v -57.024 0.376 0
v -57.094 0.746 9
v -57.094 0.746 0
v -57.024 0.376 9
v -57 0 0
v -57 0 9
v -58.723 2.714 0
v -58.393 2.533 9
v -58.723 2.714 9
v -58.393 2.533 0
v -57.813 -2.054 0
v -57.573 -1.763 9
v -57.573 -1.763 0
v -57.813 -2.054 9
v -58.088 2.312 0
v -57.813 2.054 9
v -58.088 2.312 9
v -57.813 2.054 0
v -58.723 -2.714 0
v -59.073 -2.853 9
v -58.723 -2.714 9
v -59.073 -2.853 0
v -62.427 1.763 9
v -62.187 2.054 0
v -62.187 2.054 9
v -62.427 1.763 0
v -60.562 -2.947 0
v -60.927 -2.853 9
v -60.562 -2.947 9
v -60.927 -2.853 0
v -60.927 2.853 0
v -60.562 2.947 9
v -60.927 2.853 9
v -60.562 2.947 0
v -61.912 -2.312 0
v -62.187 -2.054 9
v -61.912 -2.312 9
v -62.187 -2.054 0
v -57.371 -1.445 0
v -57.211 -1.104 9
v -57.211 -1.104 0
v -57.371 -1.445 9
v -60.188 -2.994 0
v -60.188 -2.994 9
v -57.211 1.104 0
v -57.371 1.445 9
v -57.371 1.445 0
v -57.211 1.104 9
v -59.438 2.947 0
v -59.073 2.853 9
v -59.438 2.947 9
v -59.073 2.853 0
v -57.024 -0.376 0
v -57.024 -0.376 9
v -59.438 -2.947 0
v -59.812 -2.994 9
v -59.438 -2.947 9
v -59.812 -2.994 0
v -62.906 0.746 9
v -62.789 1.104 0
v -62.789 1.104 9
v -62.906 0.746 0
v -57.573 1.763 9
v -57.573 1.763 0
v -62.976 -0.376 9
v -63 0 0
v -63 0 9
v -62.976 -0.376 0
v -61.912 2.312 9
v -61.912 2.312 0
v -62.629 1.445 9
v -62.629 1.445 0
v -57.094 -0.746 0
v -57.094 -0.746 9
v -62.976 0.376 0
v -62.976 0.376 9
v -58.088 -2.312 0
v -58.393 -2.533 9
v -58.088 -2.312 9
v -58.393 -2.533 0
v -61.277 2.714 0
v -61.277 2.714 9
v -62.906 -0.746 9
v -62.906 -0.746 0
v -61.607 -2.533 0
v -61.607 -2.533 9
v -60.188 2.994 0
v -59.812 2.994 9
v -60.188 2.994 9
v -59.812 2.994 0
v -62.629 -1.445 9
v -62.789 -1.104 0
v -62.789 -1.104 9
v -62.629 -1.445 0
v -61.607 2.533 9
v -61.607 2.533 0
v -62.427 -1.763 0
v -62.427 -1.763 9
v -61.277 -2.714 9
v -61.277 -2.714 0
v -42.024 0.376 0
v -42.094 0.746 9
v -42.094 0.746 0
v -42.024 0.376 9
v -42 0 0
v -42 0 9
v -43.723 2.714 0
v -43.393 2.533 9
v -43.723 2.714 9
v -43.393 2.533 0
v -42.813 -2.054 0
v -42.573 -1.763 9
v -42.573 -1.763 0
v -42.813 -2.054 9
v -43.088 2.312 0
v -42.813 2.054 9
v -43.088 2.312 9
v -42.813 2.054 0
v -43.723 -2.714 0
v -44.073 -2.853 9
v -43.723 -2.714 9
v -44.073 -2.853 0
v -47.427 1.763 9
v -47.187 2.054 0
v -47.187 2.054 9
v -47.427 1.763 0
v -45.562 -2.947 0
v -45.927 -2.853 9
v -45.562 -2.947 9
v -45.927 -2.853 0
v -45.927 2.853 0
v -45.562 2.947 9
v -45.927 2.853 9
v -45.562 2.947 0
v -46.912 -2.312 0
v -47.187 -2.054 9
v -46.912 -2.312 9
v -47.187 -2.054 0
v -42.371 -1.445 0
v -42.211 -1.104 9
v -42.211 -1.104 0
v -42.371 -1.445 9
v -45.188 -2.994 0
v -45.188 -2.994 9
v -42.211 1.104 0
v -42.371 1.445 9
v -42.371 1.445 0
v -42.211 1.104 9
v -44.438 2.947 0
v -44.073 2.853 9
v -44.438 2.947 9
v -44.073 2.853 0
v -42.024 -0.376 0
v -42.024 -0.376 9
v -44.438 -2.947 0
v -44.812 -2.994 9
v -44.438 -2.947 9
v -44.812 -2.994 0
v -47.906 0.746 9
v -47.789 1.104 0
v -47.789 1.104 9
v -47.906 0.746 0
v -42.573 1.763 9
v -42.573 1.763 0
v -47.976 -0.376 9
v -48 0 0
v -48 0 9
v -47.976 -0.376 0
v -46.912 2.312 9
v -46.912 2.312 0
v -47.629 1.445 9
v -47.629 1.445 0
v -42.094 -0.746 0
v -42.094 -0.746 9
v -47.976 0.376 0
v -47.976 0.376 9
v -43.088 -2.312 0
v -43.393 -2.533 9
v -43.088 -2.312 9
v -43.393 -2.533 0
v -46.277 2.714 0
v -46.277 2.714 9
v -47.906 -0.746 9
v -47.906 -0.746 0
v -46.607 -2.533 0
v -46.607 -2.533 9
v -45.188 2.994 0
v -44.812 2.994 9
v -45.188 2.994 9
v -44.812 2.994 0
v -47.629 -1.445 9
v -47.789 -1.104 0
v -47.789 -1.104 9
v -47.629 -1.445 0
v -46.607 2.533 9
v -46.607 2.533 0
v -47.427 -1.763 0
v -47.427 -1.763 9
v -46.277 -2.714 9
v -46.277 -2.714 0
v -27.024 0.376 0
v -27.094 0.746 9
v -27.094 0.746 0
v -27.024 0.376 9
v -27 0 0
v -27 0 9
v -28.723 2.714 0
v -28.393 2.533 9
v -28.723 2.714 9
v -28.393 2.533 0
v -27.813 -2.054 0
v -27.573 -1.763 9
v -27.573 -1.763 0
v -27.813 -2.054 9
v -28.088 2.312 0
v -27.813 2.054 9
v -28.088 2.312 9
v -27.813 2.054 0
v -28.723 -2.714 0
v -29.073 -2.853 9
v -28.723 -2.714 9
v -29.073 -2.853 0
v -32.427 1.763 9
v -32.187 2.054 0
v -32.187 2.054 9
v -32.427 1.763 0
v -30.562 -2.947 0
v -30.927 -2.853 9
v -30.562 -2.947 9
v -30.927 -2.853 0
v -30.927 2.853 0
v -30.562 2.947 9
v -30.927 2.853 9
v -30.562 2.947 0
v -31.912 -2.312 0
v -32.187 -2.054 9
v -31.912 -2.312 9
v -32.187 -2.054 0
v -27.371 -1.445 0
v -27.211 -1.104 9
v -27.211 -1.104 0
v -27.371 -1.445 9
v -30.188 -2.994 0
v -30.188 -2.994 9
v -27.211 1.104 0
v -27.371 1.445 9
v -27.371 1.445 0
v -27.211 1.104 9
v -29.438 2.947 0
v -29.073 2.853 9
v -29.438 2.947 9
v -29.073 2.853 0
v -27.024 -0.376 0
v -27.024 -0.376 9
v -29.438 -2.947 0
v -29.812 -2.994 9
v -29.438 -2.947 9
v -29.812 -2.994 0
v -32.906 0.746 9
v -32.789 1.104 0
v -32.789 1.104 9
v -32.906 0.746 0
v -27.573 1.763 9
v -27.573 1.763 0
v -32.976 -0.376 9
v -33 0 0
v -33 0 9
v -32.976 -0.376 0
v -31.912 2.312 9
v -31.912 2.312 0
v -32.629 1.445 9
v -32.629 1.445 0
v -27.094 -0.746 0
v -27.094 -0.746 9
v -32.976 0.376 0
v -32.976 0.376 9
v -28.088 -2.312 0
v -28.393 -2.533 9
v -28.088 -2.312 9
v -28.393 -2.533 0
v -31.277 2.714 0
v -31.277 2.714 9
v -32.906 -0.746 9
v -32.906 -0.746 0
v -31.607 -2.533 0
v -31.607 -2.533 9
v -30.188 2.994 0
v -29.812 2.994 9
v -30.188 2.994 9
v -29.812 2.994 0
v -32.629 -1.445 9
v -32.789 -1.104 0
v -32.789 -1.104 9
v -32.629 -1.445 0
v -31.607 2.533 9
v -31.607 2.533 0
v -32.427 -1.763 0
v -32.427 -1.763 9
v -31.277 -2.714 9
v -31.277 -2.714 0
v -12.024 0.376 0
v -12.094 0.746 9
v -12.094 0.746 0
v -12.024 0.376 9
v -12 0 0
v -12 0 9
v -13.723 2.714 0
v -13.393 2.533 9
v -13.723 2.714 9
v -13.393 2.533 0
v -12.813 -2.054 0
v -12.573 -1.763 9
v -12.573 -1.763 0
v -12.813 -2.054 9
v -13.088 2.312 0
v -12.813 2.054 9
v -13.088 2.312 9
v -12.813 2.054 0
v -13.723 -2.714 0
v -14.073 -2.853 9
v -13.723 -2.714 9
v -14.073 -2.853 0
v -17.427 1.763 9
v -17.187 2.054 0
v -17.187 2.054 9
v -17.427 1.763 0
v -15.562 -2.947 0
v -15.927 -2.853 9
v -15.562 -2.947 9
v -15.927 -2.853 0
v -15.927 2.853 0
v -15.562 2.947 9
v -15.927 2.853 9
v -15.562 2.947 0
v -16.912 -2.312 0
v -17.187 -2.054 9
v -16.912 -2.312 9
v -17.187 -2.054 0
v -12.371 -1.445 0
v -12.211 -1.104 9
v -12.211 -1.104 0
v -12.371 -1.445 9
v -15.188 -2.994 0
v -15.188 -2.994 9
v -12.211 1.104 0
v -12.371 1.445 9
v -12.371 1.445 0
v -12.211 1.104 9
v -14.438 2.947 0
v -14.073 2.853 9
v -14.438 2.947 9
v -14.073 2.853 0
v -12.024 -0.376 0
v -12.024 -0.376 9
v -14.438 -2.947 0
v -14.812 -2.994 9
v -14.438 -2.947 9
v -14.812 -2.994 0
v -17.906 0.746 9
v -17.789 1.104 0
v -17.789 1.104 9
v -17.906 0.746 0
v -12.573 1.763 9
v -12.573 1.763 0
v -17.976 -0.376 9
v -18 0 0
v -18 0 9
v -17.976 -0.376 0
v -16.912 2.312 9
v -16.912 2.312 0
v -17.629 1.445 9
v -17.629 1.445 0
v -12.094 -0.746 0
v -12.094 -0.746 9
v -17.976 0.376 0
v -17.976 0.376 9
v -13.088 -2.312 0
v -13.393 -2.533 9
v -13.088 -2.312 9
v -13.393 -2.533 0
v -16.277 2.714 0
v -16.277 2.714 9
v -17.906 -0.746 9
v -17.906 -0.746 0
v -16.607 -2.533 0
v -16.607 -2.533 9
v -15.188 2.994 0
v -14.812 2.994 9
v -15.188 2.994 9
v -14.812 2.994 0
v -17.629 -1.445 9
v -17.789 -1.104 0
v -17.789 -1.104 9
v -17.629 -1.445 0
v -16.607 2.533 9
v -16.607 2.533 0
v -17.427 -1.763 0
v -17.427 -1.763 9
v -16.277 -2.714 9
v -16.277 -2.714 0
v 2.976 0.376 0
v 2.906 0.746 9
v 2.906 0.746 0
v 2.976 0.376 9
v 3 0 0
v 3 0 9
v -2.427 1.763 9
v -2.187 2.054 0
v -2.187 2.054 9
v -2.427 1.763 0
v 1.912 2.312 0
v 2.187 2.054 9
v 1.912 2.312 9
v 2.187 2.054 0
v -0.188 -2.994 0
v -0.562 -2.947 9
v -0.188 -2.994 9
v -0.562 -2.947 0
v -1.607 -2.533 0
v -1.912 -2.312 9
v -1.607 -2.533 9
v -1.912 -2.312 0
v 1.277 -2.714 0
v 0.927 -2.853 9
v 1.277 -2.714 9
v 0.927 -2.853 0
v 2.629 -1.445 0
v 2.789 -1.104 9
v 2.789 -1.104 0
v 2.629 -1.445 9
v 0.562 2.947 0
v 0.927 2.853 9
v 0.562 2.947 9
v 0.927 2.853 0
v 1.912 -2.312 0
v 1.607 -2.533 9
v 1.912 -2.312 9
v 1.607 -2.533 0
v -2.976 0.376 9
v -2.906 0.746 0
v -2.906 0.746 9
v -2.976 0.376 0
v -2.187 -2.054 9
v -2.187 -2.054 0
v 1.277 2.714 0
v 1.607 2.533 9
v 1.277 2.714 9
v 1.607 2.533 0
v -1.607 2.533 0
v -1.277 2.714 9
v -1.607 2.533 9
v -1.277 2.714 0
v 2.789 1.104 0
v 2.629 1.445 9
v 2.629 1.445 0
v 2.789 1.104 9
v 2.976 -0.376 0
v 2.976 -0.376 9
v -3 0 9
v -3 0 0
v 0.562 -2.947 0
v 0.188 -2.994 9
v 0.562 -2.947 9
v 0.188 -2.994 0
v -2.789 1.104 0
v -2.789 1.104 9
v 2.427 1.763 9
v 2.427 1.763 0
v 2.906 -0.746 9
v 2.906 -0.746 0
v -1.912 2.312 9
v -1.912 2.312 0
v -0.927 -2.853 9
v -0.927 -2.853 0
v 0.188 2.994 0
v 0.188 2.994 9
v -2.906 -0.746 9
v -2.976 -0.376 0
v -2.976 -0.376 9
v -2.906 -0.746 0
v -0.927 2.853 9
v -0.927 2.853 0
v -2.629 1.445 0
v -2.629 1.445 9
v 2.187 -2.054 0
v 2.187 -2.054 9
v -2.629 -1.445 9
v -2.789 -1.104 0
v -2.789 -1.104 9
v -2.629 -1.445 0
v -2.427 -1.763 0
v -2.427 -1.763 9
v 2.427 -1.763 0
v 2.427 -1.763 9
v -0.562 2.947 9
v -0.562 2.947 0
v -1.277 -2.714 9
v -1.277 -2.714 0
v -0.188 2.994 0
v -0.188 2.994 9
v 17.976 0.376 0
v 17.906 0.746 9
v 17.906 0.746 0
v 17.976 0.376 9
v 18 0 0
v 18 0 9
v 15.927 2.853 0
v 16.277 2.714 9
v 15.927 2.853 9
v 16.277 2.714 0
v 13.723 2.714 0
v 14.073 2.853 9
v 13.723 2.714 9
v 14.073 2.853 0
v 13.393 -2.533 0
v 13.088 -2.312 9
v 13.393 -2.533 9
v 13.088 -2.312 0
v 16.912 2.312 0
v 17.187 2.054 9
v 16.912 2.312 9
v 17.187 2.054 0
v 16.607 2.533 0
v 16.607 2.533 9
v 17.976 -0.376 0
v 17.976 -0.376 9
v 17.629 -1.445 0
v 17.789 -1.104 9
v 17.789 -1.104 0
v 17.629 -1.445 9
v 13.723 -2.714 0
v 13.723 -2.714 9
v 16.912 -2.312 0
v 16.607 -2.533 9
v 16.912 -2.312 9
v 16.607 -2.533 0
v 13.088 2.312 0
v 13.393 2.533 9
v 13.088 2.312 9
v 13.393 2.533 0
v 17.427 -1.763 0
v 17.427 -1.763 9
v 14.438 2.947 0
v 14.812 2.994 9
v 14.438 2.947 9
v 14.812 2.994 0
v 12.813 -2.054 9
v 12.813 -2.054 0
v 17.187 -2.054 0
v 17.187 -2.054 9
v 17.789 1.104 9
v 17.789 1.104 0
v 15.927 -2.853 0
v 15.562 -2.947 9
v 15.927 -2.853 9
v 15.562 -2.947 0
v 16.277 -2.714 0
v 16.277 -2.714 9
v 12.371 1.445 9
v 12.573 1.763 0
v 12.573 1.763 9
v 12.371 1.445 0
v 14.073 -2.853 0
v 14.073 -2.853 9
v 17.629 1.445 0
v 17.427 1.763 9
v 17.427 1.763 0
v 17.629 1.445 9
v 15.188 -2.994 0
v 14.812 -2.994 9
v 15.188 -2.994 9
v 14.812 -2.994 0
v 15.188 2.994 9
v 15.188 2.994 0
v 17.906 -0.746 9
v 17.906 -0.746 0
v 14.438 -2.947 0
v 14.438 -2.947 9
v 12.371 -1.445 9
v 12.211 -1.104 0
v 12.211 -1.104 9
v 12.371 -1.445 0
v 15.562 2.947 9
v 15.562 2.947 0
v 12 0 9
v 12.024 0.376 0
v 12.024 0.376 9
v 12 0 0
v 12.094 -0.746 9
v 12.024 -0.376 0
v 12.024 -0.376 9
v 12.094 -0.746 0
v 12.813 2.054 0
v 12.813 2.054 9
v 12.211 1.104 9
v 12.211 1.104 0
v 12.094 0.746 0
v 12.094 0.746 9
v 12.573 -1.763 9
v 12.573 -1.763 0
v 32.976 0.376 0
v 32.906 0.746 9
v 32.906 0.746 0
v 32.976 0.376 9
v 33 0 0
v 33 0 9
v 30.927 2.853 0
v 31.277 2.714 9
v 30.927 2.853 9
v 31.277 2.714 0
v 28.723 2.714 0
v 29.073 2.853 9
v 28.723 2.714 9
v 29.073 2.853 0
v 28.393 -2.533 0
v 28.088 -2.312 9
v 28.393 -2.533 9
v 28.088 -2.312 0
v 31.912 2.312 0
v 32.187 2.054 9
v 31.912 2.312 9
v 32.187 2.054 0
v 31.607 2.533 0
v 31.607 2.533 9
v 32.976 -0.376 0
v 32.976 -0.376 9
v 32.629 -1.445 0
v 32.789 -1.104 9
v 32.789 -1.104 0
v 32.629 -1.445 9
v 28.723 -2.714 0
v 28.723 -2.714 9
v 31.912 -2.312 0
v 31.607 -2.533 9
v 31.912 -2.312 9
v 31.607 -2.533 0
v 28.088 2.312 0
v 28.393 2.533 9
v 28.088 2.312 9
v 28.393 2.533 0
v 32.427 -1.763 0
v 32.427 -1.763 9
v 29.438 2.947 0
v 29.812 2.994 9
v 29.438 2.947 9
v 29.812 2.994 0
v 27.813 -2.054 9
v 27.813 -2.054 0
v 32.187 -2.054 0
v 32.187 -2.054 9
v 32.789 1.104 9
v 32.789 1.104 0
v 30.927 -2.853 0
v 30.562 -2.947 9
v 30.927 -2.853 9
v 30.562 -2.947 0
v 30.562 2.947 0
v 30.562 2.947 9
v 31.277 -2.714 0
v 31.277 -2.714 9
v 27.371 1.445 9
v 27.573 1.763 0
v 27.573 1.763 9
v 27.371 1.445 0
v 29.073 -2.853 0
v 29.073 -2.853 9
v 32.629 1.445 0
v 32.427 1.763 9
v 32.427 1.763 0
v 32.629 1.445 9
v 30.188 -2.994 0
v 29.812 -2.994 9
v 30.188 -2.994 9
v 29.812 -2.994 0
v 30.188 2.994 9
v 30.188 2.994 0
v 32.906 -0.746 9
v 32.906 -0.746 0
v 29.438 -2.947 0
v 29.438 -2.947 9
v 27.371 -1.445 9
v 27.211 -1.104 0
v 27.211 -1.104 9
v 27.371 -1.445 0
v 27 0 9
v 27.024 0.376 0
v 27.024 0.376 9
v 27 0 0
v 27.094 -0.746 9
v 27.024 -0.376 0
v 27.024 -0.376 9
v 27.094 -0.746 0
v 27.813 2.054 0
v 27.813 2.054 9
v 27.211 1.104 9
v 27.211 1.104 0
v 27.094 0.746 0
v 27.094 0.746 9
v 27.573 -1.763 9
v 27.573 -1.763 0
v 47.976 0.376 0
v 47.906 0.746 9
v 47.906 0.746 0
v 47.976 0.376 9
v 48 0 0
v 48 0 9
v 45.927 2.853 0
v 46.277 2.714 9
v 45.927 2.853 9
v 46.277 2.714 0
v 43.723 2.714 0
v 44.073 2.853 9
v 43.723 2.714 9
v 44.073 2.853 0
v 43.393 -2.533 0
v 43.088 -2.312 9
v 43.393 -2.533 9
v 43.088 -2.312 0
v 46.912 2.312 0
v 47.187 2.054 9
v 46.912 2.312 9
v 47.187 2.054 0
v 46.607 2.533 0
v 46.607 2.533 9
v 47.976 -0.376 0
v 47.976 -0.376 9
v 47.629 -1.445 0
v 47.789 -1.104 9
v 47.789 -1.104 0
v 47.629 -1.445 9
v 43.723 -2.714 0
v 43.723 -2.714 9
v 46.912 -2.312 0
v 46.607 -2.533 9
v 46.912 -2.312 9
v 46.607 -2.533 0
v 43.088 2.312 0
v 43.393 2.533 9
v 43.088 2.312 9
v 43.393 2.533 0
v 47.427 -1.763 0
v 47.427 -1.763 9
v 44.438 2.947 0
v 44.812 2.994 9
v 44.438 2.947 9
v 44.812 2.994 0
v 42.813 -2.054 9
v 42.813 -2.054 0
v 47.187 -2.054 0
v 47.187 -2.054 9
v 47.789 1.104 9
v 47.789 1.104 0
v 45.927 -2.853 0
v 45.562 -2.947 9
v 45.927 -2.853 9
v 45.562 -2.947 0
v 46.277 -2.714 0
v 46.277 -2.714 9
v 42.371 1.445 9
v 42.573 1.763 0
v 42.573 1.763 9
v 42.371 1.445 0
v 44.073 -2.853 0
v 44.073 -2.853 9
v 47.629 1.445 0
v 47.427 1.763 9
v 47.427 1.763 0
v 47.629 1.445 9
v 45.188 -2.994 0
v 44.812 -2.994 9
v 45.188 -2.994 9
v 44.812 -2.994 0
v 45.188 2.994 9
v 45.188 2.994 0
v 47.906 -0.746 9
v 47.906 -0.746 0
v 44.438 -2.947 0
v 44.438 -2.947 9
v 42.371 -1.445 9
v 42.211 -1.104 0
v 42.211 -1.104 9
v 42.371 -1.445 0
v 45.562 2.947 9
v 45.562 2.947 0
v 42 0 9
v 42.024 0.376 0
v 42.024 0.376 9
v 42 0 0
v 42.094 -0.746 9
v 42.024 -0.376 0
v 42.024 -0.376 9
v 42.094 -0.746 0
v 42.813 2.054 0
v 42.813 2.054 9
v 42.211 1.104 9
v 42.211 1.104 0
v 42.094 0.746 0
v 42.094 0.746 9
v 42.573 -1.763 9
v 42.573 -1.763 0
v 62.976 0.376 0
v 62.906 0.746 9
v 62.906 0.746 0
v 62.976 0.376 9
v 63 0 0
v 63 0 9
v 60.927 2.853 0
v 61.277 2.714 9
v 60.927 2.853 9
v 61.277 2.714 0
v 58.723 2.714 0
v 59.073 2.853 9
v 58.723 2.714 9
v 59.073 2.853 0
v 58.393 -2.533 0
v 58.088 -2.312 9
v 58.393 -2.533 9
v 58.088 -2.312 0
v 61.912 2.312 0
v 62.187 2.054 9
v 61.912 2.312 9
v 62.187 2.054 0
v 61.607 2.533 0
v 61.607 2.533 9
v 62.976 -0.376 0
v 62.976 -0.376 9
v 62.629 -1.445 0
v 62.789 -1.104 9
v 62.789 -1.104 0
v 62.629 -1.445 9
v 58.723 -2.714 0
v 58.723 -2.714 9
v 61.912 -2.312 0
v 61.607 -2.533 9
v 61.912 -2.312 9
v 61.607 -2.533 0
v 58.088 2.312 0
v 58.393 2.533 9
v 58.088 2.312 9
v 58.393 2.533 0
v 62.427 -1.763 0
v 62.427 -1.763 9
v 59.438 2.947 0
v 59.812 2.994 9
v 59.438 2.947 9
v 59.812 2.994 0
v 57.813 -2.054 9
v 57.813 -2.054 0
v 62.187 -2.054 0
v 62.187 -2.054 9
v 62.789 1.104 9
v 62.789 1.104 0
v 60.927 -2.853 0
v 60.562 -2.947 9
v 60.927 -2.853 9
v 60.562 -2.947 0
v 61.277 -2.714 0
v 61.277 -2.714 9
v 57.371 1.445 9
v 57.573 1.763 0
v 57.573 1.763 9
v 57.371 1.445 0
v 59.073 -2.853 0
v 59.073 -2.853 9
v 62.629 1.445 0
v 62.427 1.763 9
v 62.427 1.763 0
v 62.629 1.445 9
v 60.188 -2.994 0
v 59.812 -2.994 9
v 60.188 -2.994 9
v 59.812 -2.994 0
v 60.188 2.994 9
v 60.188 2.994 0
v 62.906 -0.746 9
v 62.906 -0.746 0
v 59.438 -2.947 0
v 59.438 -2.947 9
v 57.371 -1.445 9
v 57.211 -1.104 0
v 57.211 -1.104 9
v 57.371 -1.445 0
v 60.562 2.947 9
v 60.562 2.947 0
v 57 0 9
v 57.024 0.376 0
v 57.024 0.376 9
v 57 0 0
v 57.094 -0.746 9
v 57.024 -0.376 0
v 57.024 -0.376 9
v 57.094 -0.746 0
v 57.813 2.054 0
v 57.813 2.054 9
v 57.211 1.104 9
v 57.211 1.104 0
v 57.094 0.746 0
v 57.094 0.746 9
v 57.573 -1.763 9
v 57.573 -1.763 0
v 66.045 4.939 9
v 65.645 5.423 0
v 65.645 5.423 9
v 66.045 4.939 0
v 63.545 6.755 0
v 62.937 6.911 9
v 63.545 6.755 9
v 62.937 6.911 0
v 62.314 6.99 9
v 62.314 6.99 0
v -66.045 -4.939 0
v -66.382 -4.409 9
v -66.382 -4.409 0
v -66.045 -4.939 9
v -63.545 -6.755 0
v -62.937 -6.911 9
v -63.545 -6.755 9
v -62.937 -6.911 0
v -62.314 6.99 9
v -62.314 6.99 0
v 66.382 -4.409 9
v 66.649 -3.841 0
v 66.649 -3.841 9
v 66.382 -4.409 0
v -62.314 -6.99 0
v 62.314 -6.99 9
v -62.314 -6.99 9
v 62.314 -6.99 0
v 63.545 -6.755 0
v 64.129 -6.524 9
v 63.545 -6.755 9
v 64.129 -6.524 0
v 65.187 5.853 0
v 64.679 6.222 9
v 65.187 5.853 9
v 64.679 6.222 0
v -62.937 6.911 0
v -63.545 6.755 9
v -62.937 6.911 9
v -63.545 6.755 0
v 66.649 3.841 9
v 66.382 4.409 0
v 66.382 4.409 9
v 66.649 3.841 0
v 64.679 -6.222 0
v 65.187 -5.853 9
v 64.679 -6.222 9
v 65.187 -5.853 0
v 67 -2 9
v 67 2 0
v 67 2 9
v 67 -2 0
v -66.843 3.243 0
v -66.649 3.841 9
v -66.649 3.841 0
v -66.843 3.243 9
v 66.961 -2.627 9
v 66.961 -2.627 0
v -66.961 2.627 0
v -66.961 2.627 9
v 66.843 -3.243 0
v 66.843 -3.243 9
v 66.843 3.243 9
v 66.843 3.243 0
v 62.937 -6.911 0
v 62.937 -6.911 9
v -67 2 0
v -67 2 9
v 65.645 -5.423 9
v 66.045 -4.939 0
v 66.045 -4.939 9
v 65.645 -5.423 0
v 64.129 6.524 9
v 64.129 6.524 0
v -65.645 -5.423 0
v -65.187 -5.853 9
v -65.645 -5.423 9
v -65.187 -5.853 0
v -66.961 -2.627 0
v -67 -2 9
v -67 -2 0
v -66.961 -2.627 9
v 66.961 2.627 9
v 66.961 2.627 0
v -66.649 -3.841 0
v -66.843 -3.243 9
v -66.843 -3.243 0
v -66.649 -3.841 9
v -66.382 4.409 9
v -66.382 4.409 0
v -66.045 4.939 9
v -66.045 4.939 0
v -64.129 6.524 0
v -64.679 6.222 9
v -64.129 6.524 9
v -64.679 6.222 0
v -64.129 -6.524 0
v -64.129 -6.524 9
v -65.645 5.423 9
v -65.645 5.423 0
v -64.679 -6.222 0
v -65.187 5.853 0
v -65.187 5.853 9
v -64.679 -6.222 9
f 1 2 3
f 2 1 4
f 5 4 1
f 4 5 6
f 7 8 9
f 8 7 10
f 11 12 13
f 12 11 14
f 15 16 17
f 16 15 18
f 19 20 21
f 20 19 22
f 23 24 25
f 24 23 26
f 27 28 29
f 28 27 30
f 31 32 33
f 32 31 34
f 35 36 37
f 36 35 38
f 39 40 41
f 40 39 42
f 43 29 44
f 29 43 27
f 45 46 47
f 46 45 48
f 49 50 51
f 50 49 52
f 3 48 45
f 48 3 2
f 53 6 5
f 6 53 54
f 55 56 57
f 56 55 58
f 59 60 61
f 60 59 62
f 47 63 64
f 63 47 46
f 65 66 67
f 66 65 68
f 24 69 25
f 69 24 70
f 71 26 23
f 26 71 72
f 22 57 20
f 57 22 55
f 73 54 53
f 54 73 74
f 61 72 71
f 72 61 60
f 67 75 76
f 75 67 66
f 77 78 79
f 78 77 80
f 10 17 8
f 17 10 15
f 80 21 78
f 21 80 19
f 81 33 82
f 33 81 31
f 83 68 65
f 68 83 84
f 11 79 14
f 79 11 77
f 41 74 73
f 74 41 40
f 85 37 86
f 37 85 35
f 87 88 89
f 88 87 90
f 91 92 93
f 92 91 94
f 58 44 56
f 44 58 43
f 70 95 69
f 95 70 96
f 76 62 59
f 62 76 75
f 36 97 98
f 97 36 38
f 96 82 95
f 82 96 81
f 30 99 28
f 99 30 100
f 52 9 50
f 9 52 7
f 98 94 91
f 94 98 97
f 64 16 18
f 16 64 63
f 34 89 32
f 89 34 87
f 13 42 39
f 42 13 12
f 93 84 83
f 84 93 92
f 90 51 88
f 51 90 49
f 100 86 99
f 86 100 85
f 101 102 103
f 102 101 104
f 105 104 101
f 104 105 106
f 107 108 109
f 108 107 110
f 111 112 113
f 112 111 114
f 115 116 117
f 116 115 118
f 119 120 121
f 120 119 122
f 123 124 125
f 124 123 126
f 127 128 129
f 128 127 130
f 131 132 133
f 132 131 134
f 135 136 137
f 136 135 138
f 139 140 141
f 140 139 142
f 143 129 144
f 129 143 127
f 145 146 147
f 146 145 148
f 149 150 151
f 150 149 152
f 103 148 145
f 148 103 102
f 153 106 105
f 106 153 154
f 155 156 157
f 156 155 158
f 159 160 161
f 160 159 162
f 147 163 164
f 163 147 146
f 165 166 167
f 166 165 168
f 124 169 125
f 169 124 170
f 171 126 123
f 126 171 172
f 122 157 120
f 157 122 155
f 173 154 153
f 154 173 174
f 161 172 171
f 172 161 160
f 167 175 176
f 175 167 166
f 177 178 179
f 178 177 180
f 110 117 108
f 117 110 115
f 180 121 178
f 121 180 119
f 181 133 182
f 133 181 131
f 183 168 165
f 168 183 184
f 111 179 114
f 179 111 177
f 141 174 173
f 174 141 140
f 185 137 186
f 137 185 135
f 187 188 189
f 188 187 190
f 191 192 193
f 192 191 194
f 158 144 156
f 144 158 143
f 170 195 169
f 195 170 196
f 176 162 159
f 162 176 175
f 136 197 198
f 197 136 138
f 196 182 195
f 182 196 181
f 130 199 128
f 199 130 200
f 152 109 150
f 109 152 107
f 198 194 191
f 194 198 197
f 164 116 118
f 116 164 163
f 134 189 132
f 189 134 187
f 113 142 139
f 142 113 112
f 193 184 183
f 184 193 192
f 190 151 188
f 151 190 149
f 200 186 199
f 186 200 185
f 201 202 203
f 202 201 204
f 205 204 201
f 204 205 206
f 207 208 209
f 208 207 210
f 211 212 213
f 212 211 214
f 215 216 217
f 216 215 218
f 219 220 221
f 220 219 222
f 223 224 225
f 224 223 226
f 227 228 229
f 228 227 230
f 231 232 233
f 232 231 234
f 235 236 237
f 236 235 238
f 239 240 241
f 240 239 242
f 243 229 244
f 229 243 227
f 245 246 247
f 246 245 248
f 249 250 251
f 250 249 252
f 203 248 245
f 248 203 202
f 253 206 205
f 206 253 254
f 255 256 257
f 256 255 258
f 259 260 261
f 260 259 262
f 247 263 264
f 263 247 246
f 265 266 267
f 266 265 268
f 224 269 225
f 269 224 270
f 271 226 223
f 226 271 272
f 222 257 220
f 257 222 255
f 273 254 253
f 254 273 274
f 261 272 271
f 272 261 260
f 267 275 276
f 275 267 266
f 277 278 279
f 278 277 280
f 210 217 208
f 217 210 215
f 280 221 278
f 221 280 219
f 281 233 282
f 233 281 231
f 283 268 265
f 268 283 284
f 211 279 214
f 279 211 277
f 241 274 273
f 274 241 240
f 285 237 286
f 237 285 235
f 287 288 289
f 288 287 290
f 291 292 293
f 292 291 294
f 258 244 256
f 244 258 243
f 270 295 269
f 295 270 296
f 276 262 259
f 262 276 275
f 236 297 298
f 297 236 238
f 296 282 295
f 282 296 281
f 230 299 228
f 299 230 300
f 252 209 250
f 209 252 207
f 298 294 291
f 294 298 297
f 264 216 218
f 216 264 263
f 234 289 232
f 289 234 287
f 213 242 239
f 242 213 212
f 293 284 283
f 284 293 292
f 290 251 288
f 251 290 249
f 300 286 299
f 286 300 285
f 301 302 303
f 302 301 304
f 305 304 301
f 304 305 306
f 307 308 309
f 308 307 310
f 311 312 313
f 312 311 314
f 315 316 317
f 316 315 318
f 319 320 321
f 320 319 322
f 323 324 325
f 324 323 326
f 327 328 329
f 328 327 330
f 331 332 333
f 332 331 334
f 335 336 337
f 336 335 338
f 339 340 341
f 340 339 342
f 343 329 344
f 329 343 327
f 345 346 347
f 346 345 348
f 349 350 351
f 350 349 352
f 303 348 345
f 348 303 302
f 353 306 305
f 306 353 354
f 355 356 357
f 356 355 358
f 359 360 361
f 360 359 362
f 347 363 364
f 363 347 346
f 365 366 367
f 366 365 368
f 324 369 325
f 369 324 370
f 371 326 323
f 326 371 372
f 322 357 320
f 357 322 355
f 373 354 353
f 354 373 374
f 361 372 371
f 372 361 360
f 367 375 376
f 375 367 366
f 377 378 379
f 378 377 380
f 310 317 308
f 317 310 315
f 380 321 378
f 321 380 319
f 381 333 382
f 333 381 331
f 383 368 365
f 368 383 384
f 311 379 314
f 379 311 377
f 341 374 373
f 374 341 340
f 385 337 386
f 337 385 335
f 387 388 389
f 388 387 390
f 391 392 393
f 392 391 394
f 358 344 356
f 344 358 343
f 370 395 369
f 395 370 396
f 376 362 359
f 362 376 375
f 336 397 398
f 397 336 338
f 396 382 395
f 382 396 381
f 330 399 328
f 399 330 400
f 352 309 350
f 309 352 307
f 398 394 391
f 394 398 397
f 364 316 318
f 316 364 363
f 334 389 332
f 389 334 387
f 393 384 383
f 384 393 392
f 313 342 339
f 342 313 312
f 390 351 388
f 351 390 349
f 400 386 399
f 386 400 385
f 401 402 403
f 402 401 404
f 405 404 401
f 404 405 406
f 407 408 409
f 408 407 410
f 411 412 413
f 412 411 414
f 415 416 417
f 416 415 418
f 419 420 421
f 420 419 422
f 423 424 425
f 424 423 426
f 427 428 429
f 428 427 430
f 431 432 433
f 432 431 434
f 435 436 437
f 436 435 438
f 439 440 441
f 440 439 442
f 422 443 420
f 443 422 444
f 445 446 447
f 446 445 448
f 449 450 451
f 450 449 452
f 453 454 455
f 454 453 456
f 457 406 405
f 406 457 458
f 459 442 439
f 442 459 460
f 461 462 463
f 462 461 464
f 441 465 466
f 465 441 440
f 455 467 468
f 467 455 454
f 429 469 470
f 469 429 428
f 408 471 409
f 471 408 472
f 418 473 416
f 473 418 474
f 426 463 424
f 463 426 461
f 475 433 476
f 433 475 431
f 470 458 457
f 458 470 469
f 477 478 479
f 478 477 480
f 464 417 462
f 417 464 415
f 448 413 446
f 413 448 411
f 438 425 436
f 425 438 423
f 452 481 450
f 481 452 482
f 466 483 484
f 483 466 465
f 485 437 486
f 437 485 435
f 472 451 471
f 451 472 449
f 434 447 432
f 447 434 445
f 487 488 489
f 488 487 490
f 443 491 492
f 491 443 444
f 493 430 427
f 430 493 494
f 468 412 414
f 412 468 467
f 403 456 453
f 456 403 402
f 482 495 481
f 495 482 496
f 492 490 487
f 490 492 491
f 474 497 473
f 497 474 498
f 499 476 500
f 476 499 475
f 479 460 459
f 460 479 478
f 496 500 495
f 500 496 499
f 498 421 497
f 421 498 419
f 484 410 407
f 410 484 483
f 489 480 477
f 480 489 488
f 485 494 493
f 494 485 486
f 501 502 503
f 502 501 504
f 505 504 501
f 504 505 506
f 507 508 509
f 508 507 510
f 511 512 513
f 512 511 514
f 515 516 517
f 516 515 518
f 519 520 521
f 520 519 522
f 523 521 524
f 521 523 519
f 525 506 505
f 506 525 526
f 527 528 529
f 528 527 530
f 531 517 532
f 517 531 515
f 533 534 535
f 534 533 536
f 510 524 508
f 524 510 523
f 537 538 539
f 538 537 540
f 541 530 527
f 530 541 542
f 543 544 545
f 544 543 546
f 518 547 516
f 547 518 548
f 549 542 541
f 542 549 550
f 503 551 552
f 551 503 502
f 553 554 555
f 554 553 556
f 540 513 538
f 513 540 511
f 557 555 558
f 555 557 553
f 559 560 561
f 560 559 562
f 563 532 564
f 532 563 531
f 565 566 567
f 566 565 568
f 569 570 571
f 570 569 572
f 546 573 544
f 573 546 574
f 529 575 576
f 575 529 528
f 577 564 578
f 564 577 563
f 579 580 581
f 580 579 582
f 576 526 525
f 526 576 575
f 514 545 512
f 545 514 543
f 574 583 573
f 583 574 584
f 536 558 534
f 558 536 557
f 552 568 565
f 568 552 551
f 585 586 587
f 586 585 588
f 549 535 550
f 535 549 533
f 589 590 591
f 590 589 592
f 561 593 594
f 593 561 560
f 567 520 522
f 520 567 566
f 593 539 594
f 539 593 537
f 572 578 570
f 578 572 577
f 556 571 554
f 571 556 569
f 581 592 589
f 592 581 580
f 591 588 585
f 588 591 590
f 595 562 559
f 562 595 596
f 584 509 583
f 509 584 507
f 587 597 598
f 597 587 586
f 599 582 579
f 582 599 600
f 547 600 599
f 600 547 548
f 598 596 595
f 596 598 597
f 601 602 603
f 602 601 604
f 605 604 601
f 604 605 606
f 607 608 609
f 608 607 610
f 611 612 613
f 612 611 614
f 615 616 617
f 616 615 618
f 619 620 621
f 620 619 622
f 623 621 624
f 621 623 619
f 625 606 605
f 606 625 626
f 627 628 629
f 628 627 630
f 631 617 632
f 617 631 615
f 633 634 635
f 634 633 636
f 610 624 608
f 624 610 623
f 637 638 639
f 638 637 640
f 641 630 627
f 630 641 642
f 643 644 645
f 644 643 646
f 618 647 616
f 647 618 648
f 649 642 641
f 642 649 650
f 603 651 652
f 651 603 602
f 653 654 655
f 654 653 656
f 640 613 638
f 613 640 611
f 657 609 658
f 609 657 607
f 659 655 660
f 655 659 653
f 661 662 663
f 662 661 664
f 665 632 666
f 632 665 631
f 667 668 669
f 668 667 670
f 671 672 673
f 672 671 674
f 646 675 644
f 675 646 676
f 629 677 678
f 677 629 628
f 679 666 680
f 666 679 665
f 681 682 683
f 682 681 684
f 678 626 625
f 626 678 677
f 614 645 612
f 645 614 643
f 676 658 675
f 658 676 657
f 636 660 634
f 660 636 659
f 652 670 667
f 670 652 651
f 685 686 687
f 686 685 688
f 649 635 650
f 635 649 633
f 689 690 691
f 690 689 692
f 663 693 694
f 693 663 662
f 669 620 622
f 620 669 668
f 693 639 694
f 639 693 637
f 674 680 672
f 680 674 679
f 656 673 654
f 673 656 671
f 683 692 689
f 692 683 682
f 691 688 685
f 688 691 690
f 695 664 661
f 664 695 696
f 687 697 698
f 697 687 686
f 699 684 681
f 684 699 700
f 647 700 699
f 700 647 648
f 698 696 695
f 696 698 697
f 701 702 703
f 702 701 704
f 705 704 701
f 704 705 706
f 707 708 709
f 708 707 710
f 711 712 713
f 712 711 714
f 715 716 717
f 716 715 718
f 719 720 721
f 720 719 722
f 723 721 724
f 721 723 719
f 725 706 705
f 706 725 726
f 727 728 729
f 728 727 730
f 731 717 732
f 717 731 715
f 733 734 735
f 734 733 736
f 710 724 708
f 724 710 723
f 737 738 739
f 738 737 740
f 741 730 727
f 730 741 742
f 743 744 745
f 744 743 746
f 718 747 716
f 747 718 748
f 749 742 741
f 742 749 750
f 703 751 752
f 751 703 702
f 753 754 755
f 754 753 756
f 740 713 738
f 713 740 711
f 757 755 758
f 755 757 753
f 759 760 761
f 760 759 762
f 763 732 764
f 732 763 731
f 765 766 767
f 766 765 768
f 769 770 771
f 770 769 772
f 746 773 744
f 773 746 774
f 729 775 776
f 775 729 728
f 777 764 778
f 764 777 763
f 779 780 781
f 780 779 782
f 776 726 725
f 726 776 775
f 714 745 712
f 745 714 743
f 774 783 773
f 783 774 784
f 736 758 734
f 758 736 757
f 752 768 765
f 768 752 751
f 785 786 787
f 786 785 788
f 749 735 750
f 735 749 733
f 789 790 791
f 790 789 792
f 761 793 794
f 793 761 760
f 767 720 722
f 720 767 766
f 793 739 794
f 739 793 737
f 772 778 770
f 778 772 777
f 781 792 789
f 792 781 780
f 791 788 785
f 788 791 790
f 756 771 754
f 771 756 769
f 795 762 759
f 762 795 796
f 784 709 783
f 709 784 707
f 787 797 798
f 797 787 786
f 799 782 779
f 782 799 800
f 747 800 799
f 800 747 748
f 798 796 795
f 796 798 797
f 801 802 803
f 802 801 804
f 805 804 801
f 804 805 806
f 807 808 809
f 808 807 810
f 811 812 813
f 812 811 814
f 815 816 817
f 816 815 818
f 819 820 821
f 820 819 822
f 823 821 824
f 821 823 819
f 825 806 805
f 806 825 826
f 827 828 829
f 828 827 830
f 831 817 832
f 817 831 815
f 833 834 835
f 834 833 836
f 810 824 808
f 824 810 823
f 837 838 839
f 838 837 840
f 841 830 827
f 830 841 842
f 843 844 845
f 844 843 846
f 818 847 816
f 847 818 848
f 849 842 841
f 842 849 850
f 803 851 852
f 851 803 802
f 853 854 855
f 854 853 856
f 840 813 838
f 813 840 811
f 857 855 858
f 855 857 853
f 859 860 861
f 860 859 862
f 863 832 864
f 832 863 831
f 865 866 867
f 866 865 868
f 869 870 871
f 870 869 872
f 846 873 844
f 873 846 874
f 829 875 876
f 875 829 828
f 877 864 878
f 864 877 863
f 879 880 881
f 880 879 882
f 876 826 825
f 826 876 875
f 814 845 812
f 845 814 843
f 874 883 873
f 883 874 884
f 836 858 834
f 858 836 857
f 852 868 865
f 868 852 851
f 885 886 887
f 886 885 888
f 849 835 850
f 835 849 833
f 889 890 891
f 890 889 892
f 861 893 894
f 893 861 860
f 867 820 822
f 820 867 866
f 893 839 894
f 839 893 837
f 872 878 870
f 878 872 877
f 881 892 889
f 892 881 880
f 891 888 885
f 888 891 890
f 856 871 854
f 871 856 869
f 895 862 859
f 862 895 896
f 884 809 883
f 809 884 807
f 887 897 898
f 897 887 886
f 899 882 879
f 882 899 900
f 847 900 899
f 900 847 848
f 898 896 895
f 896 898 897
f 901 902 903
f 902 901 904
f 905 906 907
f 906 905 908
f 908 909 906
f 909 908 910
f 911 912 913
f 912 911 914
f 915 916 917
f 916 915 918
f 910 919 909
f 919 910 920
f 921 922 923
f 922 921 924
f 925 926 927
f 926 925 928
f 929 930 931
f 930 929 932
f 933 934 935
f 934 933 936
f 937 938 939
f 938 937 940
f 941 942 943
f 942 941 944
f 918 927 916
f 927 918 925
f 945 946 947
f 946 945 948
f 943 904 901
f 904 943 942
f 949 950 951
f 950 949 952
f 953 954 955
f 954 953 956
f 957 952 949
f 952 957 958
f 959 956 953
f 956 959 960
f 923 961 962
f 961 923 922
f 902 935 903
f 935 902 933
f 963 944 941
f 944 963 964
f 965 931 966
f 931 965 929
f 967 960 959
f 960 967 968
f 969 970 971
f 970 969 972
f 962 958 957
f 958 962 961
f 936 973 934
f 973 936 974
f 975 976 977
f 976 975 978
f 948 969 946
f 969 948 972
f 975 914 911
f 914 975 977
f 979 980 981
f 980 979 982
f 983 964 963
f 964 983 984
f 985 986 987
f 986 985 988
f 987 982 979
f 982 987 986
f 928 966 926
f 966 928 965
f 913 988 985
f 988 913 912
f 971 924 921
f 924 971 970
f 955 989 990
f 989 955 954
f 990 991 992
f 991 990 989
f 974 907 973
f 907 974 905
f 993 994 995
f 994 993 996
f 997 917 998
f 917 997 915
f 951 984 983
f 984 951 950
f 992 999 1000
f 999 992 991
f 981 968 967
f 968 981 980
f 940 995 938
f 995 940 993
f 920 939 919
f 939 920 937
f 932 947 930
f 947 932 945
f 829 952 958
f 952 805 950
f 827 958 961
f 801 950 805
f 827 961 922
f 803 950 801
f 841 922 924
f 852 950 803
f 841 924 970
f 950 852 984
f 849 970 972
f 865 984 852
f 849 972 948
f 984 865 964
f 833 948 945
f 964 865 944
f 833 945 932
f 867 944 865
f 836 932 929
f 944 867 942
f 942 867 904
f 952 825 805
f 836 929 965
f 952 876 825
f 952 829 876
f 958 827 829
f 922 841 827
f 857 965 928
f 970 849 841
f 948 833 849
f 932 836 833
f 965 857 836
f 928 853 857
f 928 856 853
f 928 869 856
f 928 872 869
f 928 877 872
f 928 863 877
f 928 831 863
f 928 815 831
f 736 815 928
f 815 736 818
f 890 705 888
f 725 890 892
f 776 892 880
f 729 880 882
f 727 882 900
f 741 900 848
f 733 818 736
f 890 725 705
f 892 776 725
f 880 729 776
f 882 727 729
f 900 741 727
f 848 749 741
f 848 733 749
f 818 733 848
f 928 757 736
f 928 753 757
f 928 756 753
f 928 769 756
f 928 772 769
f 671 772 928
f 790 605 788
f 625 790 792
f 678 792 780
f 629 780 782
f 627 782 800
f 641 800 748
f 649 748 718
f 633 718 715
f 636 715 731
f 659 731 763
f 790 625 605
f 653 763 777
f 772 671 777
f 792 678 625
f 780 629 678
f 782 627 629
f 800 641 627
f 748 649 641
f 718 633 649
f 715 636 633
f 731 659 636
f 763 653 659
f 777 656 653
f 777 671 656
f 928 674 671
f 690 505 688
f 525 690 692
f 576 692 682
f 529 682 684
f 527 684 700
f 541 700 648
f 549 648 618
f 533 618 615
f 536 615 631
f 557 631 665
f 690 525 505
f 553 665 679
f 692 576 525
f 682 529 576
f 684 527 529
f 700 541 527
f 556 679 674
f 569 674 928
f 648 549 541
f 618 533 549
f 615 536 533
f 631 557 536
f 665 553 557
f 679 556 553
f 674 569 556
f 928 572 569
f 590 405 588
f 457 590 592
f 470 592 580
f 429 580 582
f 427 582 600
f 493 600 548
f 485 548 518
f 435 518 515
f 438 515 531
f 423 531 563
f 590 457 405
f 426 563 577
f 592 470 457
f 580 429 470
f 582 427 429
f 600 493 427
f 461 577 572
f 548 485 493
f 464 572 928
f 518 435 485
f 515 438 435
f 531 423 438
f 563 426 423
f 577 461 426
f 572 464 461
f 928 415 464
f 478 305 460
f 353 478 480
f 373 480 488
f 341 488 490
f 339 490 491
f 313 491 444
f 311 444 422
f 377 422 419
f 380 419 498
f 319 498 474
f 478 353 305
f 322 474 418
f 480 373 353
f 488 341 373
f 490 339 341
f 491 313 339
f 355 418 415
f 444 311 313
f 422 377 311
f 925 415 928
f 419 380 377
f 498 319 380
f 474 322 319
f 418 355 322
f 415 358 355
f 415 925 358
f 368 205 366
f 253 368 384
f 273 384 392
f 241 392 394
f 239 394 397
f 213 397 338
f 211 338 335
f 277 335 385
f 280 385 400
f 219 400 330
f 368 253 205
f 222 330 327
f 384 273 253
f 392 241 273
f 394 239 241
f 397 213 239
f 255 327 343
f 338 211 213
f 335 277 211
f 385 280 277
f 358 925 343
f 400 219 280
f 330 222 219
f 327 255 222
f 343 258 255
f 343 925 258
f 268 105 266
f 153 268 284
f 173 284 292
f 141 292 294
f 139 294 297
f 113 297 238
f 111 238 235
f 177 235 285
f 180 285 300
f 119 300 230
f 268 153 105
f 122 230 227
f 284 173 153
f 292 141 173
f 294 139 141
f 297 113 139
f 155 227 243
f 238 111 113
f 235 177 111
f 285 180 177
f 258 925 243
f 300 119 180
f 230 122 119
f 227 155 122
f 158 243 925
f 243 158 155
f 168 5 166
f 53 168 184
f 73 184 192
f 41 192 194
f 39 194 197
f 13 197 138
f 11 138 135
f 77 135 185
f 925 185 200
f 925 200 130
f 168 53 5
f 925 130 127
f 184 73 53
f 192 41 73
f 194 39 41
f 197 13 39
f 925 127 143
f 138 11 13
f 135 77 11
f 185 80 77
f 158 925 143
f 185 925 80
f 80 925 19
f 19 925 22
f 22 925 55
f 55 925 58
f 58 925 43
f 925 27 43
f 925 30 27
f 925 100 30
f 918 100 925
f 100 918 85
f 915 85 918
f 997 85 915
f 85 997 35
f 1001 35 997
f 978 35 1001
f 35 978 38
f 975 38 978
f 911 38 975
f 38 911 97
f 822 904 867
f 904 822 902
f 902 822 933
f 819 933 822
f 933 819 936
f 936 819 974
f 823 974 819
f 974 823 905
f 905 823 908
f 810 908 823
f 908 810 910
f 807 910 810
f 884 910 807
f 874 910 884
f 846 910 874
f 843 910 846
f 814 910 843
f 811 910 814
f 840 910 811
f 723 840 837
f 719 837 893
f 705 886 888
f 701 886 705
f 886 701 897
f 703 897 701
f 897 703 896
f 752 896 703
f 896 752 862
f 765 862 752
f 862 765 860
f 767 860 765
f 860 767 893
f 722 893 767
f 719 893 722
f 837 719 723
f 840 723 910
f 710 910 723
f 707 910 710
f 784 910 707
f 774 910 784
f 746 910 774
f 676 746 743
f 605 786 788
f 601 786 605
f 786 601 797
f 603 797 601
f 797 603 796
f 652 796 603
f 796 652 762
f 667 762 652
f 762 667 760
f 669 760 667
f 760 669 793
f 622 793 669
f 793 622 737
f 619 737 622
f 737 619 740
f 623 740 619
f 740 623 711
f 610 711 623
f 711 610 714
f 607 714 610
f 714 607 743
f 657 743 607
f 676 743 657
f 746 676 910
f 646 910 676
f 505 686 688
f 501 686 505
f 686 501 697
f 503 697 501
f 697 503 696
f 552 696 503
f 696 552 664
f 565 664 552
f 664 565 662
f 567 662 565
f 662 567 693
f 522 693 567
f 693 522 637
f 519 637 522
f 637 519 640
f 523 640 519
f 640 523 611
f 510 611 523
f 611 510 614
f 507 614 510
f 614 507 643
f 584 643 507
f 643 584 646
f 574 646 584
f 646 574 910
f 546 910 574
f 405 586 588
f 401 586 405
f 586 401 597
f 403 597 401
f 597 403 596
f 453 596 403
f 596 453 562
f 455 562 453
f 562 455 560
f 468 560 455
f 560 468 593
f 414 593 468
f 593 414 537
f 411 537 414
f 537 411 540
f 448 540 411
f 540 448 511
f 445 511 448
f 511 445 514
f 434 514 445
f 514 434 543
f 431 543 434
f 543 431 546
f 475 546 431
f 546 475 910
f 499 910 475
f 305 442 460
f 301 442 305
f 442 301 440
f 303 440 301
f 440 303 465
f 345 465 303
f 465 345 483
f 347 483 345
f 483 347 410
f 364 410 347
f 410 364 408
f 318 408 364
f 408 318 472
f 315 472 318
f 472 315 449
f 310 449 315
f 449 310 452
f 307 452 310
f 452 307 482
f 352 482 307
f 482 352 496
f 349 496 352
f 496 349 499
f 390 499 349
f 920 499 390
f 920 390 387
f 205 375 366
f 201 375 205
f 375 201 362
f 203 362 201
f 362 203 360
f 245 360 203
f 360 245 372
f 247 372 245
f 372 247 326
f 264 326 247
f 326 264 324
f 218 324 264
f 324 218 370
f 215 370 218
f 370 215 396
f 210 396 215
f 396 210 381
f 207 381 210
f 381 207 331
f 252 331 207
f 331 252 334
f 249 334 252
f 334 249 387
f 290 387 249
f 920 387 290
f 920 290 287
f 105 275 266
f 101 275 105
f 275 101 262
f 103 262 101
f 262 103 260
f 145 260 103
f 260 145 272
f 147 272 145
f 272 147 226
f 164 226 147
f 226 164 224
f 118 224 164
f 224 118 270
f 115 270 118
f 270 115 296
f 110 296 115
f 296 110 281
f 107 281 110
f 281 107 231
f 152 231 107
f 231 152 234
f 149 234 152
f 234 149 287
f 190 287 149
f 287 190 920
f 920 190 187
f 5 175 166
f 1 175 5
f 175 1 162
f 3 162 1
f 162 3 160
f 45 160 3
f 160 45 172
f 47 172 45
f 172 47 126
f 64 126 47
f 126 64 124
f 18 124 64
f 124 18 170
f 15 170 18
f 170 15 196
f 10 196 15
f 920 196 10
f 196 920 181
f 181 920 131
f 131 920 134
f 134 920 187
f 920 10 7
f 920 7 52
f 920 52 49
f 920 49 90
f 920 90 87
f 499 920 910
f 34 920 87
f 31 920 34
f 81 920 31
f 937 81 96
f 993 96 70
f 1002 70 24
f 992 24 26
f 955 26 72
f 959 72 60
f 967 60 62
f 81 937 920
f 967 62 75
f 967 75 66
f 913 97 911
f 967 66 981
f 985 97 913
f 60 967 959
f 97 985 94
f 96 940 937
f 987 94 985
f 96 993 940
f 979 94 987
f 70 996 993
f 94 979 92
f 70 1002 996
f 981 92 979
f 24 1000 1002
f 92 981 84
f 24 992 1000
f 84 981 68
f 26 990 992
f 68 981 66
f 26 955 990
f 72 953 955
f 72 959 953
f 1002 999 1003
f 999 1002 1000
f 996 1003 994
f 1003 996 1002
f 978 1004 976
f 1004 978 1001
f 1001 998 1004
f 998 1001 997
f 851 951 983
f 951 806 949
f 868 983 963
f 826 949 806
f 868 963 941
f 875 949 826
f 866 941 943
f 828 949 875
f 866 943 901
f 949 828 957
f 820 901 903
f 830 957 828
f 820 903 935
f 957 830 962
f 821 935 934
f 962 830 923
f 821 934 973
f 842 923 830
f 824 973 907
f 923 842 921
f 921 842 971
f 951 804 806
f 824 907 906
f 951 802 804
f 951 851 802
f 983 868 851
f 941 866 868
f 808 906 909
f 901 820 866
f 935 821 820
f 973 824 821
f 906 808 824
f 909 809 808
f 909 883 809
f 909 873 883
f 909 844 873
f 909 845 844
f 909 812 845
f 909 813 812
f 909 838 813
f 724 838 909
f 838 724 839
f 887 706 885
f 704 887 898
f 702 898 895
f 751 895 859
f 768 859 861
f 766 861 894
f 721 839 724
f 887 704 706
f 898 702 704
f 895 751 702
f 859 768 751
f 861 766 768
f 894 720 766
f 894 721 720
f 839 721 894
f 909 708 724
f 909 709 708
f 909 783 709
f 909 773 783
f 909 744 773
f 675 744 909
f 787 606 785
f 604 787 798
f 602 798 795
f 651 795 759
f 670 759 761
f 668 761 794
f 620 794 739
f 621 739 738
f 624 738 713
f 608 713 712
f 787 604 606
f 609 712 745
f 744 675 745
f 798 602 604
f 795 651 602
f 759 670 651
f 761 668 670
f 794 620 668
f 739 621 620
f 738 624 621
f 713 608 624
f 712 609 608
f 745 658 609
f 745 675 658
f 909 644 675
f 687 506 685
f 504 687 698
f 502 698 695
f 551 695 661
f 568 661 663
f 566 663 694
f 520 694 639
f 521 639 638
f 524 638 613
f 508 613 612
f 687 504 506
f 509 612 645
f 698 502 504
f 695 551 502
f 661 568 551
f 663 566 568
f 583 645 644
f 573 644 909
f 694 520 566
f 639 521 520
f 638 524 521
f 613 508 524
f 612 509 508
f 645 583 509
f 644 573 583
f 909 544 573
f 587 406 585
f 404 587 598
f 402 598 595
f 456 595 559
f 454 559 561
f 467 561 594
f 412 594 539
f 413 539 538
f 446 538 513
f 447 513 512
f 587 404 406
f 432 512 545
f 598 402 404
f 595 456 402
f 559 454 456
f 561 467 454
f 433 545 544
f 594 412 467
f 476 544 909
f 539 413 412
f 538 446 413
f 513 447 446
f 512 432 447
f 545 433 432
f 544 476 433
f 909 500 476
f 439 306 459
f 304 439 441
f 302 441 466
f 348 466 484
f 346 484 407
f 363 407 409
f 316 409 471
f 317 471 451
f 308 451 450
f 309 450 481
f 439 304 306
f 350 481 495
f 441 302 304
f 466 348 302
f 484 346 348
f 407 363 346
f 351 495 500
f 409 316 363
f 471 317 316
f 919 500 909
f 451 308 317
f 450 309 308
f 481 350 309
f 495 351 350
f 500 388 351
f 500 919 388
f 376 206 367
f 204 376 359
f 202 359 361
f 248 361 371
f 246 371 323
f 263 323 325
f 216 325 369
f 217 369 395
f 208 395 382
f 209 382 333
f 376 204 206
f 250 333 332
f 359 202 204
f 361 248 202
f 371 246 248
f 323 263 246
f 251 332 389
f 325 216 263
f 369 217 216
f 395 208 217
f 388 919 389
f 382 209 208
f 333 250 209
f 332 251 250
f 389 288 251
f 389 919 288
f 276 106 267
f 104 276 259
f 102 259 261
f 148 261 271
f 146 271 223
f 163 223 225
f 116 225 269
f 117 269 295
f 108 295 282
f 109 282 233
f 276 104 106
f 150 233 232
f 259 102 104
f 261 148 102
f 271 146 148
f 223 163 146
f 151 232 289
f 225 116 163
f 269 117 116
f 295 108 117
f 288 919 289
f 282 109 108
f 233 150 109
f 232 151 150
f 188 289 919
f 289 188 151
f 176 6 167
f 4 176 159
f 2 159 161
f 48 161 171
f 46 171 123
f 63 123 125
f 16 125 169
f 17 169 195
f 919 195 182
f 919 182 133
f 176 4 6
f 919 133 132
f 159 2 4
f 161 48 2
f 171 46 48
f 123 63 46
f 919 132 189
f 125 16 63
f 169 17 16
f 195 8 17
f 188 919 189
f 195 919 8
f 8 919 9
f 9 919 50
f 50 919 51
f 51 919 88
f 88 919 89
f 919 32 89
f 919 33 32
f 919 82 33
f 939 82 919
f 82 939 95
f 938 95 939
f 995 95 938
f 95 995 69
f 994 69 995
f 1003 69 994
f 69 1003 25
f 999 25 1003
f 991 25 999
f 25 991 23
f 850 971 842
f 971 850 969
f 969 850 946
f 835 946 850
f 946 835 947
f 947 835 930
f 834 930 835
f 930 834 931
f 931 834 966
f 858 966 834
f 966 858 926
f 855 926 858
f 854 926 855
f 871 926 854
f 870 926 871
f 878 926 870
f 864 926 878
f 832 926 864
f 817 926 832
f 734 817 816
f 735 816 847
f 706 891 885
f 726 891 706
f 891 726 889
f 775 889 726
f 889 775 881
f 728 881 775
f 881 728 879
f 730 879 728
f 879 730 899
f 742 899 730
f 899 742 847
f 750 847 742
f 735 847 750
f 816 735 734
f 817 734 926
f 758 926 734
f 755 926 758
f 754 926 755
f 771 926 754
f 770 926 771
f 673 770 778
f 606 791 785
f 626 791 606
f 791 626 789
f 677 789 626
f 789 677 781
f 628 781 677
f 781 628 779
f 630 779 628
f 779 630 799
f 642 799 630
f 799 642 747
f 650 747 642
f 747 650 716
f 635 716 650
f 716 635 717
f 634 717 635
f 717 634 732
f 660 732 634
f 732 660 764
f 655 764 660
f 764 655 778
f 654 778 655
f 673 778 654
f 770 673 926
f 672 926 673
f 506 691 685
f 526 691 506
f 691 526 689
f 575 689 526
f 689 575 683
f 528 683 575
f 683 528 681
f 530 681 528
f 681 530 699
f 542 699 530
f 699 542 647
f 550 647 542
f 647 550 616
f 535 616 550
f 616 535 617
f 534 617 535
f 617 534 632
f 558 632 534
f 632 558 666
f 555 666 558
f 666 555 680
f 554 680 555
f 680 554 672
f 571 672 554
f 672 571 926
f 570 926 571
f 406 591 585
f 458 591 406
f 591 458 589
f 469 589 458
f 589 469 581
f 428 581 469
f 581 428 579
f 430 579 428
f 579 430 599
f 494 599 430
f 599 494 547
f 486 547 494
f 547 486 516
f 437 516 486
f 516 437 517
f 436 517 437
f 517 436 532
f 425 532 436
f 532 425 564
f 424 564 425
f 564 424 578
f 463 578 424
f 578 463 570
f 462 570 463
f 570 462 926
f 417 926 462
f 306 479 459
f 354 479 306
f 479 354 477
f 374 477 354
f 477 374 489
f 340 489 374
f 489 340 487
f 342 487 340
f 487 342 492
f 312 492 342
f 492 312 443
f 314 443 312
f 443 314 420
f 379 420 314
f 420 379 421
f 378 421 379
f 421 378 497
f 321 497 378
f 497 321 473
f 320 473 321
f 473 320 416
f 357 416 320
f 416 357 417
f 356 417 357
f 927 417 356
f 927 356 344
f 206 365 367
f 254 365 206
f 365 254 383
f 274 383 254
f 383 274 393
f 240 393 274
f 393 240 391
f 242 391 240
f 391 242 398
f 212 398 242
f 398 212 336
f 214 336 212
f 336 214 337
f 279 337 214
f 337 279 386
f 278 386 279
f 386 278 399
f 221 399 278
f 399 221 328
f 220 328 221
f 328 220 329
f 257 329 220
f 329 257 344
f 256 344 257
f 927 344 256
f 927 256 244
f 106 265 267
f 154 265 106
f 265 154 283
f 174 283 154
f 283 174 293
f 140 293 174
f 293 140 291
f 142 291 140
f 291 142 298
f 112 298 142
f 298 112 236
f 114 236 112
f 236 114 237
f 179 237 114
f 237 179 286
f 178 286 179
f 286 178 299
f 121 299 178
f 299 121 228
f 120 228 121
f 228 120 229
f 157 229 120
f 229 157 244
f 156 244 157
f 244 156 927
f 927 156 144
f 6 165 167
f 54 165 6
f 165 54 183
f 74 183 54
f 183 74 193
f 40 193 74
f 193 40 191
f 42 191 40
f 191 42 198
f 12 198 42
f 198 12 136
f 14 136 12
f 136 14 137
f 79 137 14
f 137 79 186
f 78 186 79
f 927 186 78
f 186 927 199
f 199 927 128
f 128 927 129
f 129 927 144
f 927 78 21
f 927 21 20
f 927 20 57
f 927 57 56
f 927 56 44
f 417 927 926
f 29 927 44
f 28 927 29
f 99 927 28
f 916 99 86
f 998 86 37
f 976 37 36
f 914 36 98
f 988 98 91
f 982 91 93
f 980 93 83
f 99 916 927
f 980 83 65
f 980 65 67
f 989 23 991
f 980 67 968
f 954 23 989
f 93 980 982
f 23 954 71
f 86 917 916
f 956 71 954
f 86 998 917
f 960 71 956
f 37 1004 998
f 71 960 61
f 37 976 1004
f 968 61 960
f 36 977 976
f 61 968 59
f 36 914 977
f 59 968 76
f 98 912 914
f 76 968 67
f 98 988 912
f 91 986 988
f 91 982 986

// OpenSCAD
$fn = 50;


difference() {
	union() {
		hull() {
			translate(v = [-62.0000000000, 2.0000000000, 0]) {
				cylinder(h = 9, r = 5);
			}
			translate(v = [62.0000000000, 2.0000000000, 0]) {
				cylinder(h = 9, r = 5);
			}
			translate(v = [-62.0000000000, -2.0000000000, 0]) {
				cylinder(h = 9, r = 5);
			}
			translate(v = [62.0000000000, -2.0000000000, 0]) {
				cylinder(h = 9, r = 5);
			}
		}
	}
	union() {
		translate(v = [-60.0000000000, 0.0000000000, 0]) {
			translate(v = [0, 0, -100]) {
				cylinder(h = 200, r = 3.0000000000);
			}
		}
		translate(v = [-45.0000000000, 0.0000000000, 0]) {
			translate(v = [0, 0, -100]) {
				cylinder(h = 200, r = 3.0000000000);
			}
		}
		translate(v = [-30.0000000000, 0.0000000000, 0]) {
			translate(v = [0, 0, -100]) {
				cylinder(h = 200, r = 3.0000000000);
			}
		}
		translate(v = [-15.0000000000, 0.0000000000, 0]) {
			translate(v = [0, 0, -100]) {
				cylinder(h = 200, r = 3.0000000000);
			}
		}
		translate(v = [0, 0, -100]) {
			cylinder(h = 200, r = 3.0000000000);
		}
		translate(v = [15.0000000000, 0.0000000000, 0]) {
			translate(v = [0, 0, -100]) {
				cylinder(h = 200, r = 3.0000000000);
			}
		}
		translate(v = [30.0000000000, 0.0000000000, 0]) {
			translate(v = [0, 0, -100]) {
				cylinder(h = 200, r = 3.0000000000);
			}
		}
		translate(v = [45.0000000000, 0.0000000000, 0]) {
			translate(v = [0, 0, -100]) {
				cylinder(h = 200, r = 3.0000000000);
			}
		}
		translate(v = [60.0000000000, 0.0000000000, 0]) {
			translate(v = [0, 0, -100]) {
				cylinder(h = 200, r = 3.0000000000);
			}
		}
	}
}
